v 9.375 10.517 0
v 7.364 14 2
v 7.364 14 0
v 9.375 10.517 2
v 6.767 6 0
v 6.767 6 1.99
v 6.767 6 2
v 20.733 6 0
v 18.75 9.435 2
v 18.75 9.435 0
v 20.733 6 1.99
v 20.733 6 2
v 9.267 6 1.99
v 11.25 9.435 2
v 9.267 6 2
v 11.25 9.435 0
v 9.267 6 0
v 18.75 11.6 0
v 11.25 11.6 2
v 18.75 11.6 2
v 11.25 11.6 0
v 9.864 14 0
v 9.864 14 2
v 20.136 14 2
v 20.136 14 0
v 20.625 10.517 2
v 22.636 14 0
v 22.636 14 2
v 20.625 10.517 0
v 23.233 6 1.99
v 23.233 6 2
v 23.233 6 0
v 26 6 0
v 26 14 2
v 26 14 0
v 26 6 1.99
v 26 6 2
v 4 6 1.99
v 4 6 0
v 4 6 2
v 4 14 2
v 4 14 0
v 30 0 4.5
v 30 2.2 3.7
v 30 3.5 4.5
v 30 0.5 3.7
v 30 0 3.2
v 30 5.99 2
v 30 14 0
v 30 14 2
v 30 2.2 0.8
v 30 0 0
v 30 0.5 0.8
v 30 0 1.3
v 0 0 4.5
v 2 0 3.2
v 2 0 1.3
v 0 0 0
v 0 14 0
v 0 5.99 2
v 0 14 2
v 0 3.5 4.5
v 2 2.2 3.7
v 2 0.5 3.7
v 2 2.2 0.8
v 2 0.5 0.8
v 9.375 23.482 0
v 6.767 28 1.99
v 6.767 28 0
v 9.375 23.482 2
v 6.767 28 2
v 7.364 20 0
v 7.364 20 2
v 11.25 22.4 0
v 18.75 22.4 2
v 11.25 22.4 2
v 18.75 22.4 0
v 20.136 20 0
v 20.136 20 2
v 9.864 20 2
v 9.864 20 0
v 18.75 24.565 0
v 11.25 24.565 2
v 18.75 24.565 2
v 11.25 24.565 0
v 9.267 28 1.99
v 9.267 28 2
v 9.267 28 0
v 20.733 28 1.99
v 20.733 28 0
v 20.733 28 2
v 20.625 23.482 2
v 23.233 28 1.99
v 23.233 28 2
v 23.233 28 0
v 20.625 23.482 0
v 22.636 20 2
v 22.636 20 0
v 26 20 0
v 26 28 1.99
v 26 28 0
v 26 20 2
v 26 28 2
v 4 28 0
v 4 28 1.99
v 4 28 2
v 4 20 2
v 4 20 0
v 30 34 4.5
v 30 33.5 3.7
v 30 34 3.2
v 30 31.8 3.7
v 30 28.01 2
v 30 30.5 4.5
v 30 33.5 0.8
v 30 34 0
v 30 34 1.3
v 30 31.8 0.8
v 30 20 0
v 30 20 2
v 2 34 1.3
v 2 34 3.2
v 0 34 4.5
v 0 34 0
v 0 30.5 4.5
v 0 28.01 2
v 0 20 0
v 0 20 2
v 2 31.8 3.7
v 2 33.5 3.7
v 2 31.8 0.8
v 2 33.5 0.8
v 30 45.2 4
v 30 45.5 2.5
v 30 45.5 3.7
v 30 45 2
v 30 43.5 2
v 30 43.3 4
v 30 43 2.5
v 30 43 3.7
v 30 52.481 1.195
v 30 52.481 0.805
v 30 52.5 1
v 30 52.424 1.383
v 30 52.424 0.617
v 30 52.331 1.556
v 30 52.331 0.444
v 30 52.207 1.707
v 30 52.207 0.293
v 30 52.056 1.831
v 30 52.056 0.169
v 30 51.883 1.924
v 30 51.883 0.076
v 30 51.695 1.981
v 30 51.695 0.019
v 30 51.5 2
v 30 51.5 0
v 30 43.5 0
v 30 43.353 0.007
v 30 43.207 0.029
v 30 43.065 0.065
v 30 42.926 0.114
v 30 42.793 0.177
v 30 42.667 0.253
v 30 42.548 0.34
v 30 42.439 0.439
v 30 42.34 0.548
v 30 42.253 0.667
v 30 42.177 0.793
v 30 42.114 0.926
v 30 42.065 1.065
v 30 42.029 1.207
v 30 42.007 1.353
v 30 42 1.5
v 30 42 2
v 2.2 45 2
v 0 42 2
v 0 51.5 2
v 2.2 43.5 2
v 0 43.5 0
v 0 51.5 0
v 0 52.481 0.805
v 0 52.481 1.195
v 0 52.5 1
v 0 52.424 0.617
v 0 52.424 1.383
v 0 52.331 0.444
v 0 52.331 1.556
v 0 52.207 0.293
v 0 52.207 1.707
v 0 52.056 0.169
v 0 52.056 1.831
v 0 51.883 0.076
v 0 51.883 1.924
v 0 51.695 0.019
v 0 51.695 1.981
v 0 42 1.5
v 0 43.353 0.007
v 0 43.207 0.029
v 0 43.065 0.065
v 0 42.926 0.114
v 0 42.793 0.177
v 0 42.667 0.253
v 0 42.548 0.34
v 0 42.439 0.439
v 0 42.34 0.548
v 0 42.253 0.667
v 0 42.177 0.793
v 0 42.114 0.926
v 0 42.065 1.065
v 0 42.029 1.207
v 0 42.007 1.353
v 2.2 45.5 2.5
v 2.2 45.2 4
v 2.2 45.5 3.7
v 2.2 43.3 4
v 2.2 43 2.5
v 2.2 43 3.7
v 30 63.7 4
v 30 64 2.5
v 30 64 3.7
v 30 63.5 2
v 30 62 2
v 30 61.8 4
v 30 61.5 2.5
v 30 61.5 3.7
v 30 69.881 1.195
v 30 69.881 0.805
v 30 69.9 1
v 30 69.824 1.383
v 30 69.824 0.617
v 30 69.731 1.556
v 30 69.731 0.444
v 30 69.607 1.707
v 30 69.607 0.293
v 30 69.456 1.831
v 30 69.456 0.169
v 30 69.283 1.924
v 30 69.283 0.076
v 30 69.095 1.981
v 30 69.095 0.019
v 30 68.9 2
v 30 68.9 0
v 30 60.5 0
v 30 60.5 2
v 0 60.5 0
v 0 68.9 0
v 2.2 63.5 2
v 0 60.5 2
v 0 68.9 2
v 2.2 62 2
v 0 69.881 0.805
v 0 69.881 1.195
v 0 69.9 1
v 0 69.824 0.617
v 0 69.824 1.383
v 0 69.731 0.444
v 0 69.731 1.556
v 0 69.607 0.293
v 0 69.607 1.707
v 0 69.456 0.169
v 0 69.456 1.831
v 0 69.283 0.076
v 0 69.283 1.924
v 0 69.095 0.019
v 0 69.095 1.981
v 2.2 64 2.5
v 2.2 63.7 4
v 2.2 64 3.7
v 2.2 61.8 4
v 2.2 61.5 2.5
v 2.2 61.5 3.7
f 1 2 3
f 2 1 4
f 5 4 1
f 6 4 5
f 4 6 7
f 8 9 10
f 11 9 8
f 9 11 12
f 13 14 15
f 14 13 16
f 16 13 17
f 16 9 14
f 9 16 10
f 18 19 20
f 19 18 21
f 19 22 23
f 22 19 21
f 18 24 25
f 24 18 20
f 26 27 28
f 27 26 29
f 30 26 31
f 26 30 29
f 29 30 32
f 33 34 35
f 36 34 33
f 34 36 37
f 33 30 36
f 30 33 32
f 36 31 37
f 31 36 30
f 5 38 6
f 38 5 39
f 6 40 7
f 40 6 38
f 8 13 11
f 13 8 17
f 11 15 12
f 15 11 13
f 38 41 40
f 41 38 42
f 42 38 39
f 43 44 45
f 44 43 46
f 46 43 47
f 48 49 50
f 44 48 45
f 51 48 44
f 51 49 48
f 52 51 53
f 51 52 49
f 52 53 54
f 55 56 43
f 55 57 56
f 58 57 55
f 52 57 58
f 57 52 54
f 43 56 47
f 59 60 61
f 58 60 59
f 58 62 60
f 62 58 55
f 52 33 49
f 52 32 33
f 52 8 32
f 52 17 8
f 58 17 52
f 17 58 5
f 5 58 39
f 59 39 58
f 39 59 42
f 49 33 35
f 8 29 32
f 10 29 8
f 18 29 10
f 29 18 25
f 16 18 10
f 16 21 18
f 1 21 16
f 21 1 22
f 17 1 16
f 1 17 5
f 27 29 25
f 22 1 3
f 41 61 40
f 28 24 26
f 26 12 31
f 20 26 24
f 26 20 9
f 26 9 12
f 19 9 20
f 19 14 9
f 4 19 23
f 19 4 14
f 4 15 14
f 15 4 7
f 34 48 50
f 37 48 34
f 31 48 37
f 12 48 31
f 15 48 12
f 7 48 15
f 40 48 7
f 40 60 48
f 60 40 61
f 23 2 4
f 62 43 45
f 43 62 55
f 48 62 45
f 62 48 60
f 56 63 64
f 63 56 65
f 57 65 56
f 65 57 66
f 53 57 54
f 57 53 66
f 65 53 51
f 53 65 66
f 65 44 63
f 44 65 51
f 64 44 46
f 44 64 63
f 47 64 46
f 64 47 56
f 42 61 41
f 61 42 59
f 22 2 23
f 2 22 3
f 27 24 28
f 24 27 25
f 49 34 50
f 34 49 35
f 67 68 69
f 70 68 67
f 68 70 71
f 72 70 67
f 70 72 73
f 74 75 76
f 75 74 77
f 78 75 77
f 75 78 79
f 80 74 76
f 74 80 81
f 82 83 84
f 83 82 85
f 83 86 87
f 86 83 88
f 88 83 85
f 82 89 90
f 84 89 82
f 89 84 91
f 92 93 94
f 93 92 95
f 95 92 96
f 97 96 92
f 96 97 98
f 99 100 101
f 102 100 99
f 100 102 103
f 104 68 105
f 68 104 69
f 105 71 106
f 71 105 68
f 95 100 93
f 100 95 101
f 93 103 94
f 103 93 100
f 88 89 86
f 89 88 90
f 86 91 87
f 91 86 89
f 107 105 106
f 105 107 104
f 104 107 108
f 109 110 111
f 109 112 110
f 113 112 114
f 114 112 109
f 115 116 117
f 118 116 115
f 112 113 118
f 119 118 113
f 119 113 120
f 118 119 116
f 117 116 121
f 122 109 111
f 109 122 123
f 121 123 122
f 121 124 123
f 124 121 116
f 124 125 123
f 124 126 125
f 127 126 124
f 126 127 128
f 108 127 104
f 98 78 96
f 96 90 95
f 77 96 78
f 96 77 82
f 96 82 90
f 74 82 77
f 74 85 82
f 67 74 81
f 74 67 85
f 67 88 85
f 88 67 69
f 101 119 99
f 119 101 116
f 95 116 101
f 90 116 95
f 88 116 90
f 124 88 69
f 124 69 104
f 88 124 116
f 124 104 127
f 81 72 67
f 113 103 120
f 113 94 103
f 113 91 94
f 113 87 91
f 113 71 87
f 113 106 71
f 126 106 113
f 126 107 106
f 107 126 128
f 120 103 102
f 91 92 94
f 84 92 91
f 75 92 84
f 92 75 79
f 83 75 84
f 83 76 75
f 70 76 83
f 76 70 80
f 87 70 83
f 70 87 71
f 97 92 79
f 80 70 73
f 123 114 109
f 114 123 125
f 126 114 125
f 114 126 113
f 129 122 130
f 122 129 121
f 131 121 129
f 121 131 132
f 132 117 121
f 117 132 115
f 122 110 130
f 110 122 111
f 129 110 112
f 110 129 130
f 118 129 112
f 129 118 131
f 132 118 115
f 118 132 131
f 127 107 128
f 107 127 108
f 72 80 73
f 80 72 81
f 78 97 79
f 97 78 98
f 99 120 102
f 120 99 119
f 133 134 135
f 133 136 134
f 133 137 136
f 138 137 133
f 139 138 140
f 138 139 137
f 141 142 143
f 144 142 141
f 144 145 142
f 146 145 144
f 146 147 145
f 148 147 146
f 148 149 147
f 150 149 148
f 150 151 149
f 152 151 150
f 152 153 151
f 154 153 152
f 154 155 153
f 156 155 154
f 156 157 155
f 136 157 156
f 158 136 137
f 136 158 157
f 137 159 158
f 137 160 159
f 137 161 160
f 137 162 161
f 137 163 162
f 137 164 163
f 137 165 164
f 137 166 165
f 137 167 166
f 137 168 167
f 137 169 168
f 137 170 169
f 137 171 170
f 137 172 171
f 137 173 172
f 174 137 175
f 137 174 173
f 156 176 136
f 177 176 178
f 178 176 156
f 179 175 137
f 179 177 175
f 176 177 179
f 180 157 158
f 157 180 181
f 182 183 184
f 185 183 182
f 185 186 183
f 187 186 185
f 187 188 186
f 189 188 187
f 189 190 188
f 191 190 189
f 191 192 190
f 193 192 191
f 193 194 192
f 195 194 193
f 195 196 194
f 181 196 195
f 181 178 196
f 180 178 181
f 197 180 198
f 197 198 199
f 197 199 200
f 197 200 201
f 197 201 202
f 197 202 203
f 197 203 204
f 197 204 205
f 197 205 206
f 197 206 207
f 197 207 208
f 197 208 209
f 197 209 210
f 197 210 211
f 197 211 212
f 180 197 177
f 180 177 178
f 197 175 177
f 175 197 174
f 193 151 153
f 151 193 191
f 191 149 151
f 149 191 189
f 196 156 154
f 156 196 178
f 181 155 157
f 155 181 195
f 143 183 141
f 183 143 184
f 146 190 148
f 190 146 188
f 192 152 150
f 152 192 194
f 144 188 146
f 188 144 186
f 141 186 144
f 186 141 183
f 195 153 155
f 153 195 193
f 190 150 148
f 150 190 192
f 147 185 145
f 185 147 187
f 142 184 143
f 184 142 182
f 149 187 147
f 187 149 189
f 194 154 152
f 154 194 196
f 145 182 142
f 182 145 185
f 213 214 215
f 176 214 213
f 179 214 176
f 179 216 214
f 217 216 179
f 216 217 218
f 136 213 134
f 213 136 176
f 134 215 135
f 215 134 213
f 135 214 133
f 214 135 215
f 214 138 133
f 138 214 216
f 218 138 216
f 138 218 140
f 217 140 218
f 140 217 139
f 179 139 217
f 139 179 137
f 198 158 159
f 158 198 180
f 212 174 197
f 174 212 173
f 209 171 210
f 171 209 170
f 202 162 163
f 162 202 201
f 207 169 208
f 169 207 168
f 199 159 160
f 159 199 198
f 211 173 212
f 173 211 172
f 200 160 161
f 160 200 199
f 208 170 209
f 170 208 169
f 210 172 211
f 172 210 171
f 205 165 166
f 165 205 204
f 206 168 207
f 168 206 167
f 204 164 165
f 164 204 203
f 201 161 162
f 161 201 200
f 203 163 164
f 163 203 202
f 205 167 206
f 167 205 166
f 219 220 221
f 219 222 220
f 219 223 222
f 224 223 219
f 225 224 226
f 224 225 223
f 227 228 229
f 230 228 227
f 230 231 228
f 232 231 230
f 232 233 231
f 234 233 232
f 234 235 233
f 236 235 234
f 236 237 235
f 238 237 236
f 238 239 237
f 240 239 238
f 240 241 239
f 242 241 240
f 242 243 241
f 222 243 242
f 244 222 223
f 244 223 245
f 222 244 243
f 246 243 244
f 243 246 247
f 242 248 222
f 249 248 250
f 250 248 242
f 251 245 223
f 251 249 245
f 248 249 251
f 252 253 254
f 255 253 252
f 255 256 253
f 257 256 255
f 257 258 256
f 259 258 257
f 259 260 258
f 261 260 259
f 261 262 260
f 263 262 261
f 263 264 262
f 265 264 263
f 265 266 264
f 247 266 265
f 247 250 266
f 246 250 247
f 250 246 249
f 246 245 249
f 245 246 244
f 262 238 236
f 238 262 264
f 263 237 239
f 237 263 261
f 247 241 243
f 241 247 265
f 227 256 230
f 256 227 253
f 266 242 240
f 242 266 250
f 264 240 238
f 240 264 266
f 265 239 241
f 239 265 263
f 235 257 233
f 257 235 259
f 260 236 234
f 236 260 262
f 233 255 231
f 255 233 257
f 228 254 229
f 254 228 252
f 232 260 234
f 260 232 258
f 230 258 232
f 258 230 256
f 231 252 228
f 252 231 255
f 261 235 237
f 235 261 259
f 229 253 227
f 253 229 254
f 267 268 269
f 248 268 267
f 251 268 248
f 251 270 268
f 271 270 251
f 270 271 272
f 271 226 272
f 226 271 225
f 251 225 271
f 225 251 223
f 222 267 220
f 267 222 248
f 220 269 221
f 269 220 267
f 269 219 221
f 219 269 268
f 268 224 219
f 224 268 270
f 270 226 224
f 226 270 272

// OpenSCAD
// Wake modular: flat baseplate + separate short (top) and long (bottom) lips.
// Both lips are flat plates with a dovetail ridge that slides into a groove cut in the
// top / bottom edge of the baseplate. Both thickening ramps are on the back (D), so the
// baseplate prints flat, front (F) down, with no supports.
//
// Letters: D back face, F front face, A/E top/underside of a lip, B short-lip free edge,
//   G long-lip shelf, H long-lip free edge, J long-lip underside,
//   K blind end (x=0), L open end (x=width) where the glue goes.

part      = "print";   // "print" | "baseplate" | "top_lip" | "bottom_lip" | "assembled"
test_mode = true;      // true = 30mm coupons, false = full riser

width            = test_mode ? 30 : 175;
back_height      = 70.5;   // overall height, lip underside to lip top (as v27)
bottom_lip_depth = 20;
wall             = 2;

hex_size = 15;
hex_gap  = 2.5;
border_x = 4;

fillet_r = 1.5;

brand_text   = "BlueBytes";
version_text = "Wake v27";
tag_size     = 3.5;
tag_depth    = 0.5;
tag_font     = "Liberation Sans:style=Bold";
tag_margin_x = 10;
tag_margin_y = 6;

// ramps + dovetail
band_t     = 2.5;   // ramp thickness added behind the panel
band_h     = 6;     // ramp height at each end, 45 deg underside
lip_reach  = 4.9;   // short lip length past face D
ridge_h    = 2.0;   // ridge height into the groove
ridge_head = 2.5;   // ridge head width
flare      = 0.5;   // 45 deg flank, neck = head - 2*flare
dt_clear   = 0.2;   // clearance per side
dt_stop    = 2;     // solid end wall at blind end K
tip_ch     = 0.3;

coupon_h       = 14;
test_lip_depth = 8;  // long lip depth in test_mode

z_bot = wall;
z_top = back_height - wall;
D_y   = -band_t;
yc    = D_y + (wall + band_t) / 2;   // dovetail centre line

$fn = 32;

module hex_grid(w, h) {
    pitch  = hex_size + hex_gap;
    step_x = pitch * 0.75;
    step_z = pitch * 0.866;
    cx = w / 2;
    cz = h / 2;
    ncols = ceil(w / (2 * step_x)) + 2;
    nrows = ceil(h / (2 * step_z)) + 2;
    for (col = [-ncols : ncols]) {
        x = cx + col * step_x;
        parity = ((col % 2) + 2) % 2;
        z_offset = (parity == 0) ? 0 : step_z / 2;
        for (row = [-nrows : nrows]) {
            z = cz + row * step_z + z_offset;
            translate([x, wall / 2, z])
                rotate([90, 0, 0])
                    cylinder(d = hex_size, h = wall + 4, center = true, $fn = 6);
        }
    }
}

module hex_pattern(w, h) {
    intersection() {
        hex_grid(w, h);
        cube([w, wall + 4, h]);
    }
}

// profiles are (y, z), extruded along X
module along_x(x0, len) {
    translate([x0, 0, 0]) rotate([90, 0, 90]) linear_extrude(len) children();
}

// e = plane of the lip joint face, s = +1 groove/ridge goes up, -1 goes down
module groove(e, s) {
    m = (ridge_head - 2 * flare) / 2 + dt_clear;
    h = ridge_head / 2 + dt_clear;
    d = ridge_h + dt_clear;
    along_x(dt_stop, width - dt_stop + 1)
        polygon([[yc - m, e - s], [yc - m, e], [yc - h, e + s * flare],
                 [yc - h, e + s * d], [yc + h, e + s * d], [yc + h, e + s * flare],
                 [yc + m, e], [yc + m, e - s]]);
}

module ridge(e, s) {
    n  = (ridge_head - 2 * flare) / 2;
    hh = ridge_head / 2;
    along_x(dt_stop + dt_clear, width - dt_stop - dt_clear)
        polygon([[yc - n, e - s * 0.01], [yc - n, e], [yc - hh, e + s * flare],
                 [yc - hh, e + s * (ridge_h - tip_ch)], [yc - hh + tip_ch, e + s * ridge_h],
                 [yc + hh - tip_ch, e + s * ridge_h], [yc + hh, e + s * (ridge_h - tip_ch)],
                 [yc + hh, e + s * flare], [yc + n, e], [yc + n, e - s * 0.01]]);
}

module panel() {
    translate([0, 0, z_bot]) difference() {
        cube([width, wall, z_top - z_bot]);
        translate([border_x, -1, band_h])
            hex_pattern(width - 2 * border_x, z_top - z_bot - 2 * band_h);
    }
}

module bands() {
    v = band_h - band_t;
    along_x(0, width)
        polygon([[0.01, z_bot], [D_y, z_bot], [D_y, z_bot + v], [0.01, z_bot + band_h]]);
    along_x(0, width)
        polygon([[0.01, z_top], [D_y, z_top], [D_y, z_top - v], [0.01, z_top - band_h]]);
}

module baseplate() {
    difference() {
        union() { panel(); bands(); }
        groove(z_bot, 1);
        groove(z_top, -1);
    }
}

module rounded_lip(w, depth) {
    r = wall / 2;
    union() {
        cube([w, depth - r, wall]);
        translate([0, depth - r, r])
            rotate([0, 90, 0])
                cylinder(r = r, h = w, $fn = 32);
    }
}

module outer_round(y0, z0, r) {
    translate([0, y0, z0])
        difference() {
            cube([width, r, r]);
            translate([0, r, r])
                rotate([0, 90, 0])
                    cylinder(r = r, h = width, $fn = 64);
        }
}

module tag_text(txt, x_pos) {
    translate([x_pos, bottom_lip_depth - tag_margin_y, wall - tag_depth])
        rotate([0, 0, 180])
            linear_extrude(height = tag_depth + 0.5)
                text(txt, size = tag_size, font = tag_font,
                     halign = "center", valign = "center");
}

module top_lip() {
    translate([0, wall, z_top]) mirror([0, 1, 0])
        rounded_lip(width, wall - D_y + lip_reach);
    ridge(z_top, -1);
}

module bottom_lip() {
    end_y = test_mode ? test_lip_depth : bottom_lip_depth;
    difference() {
        union() {
            translate([0, D_y, 0]) rounded_lip(width, end_y - D_y);
            ridge(z_bot, 1);
        }
        outer_round(D_y, 0, fillet_r);
        if (!test_mode) {
            tag_text(brand_text, width - border_x - tag_margin_x);
            tag_text(version_text, border_x + tag_margin_x);
        }
    }
}

// baseplate prints F down, ramps face up
module flat(z0) { translate([0, -z0, wall]) rotate([-90, 0, 0]) children(); }

module coupon(z0, z1) {
    intersection() {
        baseplate();
        translate([-1, -10, z0]) cube([width + 2, 30, z1 - z0]);
    }
}

module top_lip_print()    { translate([0, wall, back_height]) rotate([180, 0, 0]) top_lip(); }
module bottom_lip_print() { translate([0, -D_y, 0]) bottom_lip(); }

module layout() {
    lip_len = (test_mode ? test_lip_depth : bottom_lip_depth) - D_y;
    y0 = test_mode ? 2 * coupon_h + 14 : (z_top - z_bot) + 8;
    if (test_mode) {
        flat(z_bot) coupon(z_bot, z_bot + coupon_h);
        translate([0, coupon_h + 6, 0]) flat(z_top - coupon_h) coupon(z_top - coupon_h, z_top);
    } else {
        flat(z_bot) baseplate();
    }
    translate([0, y0, 0]) bottom_lip_print();
    translate([0, y0 + lip_len + 8, 0]) top_lip_print();
}

if (part == "baseplate") baseplate();
else if (part == "top_lip") top_lip();
else if (part == "bottom_lip") bottom_lip();
else if (part == "assembled") { baseplate(); top_lip(); bottom_lip(); }
else layout();
